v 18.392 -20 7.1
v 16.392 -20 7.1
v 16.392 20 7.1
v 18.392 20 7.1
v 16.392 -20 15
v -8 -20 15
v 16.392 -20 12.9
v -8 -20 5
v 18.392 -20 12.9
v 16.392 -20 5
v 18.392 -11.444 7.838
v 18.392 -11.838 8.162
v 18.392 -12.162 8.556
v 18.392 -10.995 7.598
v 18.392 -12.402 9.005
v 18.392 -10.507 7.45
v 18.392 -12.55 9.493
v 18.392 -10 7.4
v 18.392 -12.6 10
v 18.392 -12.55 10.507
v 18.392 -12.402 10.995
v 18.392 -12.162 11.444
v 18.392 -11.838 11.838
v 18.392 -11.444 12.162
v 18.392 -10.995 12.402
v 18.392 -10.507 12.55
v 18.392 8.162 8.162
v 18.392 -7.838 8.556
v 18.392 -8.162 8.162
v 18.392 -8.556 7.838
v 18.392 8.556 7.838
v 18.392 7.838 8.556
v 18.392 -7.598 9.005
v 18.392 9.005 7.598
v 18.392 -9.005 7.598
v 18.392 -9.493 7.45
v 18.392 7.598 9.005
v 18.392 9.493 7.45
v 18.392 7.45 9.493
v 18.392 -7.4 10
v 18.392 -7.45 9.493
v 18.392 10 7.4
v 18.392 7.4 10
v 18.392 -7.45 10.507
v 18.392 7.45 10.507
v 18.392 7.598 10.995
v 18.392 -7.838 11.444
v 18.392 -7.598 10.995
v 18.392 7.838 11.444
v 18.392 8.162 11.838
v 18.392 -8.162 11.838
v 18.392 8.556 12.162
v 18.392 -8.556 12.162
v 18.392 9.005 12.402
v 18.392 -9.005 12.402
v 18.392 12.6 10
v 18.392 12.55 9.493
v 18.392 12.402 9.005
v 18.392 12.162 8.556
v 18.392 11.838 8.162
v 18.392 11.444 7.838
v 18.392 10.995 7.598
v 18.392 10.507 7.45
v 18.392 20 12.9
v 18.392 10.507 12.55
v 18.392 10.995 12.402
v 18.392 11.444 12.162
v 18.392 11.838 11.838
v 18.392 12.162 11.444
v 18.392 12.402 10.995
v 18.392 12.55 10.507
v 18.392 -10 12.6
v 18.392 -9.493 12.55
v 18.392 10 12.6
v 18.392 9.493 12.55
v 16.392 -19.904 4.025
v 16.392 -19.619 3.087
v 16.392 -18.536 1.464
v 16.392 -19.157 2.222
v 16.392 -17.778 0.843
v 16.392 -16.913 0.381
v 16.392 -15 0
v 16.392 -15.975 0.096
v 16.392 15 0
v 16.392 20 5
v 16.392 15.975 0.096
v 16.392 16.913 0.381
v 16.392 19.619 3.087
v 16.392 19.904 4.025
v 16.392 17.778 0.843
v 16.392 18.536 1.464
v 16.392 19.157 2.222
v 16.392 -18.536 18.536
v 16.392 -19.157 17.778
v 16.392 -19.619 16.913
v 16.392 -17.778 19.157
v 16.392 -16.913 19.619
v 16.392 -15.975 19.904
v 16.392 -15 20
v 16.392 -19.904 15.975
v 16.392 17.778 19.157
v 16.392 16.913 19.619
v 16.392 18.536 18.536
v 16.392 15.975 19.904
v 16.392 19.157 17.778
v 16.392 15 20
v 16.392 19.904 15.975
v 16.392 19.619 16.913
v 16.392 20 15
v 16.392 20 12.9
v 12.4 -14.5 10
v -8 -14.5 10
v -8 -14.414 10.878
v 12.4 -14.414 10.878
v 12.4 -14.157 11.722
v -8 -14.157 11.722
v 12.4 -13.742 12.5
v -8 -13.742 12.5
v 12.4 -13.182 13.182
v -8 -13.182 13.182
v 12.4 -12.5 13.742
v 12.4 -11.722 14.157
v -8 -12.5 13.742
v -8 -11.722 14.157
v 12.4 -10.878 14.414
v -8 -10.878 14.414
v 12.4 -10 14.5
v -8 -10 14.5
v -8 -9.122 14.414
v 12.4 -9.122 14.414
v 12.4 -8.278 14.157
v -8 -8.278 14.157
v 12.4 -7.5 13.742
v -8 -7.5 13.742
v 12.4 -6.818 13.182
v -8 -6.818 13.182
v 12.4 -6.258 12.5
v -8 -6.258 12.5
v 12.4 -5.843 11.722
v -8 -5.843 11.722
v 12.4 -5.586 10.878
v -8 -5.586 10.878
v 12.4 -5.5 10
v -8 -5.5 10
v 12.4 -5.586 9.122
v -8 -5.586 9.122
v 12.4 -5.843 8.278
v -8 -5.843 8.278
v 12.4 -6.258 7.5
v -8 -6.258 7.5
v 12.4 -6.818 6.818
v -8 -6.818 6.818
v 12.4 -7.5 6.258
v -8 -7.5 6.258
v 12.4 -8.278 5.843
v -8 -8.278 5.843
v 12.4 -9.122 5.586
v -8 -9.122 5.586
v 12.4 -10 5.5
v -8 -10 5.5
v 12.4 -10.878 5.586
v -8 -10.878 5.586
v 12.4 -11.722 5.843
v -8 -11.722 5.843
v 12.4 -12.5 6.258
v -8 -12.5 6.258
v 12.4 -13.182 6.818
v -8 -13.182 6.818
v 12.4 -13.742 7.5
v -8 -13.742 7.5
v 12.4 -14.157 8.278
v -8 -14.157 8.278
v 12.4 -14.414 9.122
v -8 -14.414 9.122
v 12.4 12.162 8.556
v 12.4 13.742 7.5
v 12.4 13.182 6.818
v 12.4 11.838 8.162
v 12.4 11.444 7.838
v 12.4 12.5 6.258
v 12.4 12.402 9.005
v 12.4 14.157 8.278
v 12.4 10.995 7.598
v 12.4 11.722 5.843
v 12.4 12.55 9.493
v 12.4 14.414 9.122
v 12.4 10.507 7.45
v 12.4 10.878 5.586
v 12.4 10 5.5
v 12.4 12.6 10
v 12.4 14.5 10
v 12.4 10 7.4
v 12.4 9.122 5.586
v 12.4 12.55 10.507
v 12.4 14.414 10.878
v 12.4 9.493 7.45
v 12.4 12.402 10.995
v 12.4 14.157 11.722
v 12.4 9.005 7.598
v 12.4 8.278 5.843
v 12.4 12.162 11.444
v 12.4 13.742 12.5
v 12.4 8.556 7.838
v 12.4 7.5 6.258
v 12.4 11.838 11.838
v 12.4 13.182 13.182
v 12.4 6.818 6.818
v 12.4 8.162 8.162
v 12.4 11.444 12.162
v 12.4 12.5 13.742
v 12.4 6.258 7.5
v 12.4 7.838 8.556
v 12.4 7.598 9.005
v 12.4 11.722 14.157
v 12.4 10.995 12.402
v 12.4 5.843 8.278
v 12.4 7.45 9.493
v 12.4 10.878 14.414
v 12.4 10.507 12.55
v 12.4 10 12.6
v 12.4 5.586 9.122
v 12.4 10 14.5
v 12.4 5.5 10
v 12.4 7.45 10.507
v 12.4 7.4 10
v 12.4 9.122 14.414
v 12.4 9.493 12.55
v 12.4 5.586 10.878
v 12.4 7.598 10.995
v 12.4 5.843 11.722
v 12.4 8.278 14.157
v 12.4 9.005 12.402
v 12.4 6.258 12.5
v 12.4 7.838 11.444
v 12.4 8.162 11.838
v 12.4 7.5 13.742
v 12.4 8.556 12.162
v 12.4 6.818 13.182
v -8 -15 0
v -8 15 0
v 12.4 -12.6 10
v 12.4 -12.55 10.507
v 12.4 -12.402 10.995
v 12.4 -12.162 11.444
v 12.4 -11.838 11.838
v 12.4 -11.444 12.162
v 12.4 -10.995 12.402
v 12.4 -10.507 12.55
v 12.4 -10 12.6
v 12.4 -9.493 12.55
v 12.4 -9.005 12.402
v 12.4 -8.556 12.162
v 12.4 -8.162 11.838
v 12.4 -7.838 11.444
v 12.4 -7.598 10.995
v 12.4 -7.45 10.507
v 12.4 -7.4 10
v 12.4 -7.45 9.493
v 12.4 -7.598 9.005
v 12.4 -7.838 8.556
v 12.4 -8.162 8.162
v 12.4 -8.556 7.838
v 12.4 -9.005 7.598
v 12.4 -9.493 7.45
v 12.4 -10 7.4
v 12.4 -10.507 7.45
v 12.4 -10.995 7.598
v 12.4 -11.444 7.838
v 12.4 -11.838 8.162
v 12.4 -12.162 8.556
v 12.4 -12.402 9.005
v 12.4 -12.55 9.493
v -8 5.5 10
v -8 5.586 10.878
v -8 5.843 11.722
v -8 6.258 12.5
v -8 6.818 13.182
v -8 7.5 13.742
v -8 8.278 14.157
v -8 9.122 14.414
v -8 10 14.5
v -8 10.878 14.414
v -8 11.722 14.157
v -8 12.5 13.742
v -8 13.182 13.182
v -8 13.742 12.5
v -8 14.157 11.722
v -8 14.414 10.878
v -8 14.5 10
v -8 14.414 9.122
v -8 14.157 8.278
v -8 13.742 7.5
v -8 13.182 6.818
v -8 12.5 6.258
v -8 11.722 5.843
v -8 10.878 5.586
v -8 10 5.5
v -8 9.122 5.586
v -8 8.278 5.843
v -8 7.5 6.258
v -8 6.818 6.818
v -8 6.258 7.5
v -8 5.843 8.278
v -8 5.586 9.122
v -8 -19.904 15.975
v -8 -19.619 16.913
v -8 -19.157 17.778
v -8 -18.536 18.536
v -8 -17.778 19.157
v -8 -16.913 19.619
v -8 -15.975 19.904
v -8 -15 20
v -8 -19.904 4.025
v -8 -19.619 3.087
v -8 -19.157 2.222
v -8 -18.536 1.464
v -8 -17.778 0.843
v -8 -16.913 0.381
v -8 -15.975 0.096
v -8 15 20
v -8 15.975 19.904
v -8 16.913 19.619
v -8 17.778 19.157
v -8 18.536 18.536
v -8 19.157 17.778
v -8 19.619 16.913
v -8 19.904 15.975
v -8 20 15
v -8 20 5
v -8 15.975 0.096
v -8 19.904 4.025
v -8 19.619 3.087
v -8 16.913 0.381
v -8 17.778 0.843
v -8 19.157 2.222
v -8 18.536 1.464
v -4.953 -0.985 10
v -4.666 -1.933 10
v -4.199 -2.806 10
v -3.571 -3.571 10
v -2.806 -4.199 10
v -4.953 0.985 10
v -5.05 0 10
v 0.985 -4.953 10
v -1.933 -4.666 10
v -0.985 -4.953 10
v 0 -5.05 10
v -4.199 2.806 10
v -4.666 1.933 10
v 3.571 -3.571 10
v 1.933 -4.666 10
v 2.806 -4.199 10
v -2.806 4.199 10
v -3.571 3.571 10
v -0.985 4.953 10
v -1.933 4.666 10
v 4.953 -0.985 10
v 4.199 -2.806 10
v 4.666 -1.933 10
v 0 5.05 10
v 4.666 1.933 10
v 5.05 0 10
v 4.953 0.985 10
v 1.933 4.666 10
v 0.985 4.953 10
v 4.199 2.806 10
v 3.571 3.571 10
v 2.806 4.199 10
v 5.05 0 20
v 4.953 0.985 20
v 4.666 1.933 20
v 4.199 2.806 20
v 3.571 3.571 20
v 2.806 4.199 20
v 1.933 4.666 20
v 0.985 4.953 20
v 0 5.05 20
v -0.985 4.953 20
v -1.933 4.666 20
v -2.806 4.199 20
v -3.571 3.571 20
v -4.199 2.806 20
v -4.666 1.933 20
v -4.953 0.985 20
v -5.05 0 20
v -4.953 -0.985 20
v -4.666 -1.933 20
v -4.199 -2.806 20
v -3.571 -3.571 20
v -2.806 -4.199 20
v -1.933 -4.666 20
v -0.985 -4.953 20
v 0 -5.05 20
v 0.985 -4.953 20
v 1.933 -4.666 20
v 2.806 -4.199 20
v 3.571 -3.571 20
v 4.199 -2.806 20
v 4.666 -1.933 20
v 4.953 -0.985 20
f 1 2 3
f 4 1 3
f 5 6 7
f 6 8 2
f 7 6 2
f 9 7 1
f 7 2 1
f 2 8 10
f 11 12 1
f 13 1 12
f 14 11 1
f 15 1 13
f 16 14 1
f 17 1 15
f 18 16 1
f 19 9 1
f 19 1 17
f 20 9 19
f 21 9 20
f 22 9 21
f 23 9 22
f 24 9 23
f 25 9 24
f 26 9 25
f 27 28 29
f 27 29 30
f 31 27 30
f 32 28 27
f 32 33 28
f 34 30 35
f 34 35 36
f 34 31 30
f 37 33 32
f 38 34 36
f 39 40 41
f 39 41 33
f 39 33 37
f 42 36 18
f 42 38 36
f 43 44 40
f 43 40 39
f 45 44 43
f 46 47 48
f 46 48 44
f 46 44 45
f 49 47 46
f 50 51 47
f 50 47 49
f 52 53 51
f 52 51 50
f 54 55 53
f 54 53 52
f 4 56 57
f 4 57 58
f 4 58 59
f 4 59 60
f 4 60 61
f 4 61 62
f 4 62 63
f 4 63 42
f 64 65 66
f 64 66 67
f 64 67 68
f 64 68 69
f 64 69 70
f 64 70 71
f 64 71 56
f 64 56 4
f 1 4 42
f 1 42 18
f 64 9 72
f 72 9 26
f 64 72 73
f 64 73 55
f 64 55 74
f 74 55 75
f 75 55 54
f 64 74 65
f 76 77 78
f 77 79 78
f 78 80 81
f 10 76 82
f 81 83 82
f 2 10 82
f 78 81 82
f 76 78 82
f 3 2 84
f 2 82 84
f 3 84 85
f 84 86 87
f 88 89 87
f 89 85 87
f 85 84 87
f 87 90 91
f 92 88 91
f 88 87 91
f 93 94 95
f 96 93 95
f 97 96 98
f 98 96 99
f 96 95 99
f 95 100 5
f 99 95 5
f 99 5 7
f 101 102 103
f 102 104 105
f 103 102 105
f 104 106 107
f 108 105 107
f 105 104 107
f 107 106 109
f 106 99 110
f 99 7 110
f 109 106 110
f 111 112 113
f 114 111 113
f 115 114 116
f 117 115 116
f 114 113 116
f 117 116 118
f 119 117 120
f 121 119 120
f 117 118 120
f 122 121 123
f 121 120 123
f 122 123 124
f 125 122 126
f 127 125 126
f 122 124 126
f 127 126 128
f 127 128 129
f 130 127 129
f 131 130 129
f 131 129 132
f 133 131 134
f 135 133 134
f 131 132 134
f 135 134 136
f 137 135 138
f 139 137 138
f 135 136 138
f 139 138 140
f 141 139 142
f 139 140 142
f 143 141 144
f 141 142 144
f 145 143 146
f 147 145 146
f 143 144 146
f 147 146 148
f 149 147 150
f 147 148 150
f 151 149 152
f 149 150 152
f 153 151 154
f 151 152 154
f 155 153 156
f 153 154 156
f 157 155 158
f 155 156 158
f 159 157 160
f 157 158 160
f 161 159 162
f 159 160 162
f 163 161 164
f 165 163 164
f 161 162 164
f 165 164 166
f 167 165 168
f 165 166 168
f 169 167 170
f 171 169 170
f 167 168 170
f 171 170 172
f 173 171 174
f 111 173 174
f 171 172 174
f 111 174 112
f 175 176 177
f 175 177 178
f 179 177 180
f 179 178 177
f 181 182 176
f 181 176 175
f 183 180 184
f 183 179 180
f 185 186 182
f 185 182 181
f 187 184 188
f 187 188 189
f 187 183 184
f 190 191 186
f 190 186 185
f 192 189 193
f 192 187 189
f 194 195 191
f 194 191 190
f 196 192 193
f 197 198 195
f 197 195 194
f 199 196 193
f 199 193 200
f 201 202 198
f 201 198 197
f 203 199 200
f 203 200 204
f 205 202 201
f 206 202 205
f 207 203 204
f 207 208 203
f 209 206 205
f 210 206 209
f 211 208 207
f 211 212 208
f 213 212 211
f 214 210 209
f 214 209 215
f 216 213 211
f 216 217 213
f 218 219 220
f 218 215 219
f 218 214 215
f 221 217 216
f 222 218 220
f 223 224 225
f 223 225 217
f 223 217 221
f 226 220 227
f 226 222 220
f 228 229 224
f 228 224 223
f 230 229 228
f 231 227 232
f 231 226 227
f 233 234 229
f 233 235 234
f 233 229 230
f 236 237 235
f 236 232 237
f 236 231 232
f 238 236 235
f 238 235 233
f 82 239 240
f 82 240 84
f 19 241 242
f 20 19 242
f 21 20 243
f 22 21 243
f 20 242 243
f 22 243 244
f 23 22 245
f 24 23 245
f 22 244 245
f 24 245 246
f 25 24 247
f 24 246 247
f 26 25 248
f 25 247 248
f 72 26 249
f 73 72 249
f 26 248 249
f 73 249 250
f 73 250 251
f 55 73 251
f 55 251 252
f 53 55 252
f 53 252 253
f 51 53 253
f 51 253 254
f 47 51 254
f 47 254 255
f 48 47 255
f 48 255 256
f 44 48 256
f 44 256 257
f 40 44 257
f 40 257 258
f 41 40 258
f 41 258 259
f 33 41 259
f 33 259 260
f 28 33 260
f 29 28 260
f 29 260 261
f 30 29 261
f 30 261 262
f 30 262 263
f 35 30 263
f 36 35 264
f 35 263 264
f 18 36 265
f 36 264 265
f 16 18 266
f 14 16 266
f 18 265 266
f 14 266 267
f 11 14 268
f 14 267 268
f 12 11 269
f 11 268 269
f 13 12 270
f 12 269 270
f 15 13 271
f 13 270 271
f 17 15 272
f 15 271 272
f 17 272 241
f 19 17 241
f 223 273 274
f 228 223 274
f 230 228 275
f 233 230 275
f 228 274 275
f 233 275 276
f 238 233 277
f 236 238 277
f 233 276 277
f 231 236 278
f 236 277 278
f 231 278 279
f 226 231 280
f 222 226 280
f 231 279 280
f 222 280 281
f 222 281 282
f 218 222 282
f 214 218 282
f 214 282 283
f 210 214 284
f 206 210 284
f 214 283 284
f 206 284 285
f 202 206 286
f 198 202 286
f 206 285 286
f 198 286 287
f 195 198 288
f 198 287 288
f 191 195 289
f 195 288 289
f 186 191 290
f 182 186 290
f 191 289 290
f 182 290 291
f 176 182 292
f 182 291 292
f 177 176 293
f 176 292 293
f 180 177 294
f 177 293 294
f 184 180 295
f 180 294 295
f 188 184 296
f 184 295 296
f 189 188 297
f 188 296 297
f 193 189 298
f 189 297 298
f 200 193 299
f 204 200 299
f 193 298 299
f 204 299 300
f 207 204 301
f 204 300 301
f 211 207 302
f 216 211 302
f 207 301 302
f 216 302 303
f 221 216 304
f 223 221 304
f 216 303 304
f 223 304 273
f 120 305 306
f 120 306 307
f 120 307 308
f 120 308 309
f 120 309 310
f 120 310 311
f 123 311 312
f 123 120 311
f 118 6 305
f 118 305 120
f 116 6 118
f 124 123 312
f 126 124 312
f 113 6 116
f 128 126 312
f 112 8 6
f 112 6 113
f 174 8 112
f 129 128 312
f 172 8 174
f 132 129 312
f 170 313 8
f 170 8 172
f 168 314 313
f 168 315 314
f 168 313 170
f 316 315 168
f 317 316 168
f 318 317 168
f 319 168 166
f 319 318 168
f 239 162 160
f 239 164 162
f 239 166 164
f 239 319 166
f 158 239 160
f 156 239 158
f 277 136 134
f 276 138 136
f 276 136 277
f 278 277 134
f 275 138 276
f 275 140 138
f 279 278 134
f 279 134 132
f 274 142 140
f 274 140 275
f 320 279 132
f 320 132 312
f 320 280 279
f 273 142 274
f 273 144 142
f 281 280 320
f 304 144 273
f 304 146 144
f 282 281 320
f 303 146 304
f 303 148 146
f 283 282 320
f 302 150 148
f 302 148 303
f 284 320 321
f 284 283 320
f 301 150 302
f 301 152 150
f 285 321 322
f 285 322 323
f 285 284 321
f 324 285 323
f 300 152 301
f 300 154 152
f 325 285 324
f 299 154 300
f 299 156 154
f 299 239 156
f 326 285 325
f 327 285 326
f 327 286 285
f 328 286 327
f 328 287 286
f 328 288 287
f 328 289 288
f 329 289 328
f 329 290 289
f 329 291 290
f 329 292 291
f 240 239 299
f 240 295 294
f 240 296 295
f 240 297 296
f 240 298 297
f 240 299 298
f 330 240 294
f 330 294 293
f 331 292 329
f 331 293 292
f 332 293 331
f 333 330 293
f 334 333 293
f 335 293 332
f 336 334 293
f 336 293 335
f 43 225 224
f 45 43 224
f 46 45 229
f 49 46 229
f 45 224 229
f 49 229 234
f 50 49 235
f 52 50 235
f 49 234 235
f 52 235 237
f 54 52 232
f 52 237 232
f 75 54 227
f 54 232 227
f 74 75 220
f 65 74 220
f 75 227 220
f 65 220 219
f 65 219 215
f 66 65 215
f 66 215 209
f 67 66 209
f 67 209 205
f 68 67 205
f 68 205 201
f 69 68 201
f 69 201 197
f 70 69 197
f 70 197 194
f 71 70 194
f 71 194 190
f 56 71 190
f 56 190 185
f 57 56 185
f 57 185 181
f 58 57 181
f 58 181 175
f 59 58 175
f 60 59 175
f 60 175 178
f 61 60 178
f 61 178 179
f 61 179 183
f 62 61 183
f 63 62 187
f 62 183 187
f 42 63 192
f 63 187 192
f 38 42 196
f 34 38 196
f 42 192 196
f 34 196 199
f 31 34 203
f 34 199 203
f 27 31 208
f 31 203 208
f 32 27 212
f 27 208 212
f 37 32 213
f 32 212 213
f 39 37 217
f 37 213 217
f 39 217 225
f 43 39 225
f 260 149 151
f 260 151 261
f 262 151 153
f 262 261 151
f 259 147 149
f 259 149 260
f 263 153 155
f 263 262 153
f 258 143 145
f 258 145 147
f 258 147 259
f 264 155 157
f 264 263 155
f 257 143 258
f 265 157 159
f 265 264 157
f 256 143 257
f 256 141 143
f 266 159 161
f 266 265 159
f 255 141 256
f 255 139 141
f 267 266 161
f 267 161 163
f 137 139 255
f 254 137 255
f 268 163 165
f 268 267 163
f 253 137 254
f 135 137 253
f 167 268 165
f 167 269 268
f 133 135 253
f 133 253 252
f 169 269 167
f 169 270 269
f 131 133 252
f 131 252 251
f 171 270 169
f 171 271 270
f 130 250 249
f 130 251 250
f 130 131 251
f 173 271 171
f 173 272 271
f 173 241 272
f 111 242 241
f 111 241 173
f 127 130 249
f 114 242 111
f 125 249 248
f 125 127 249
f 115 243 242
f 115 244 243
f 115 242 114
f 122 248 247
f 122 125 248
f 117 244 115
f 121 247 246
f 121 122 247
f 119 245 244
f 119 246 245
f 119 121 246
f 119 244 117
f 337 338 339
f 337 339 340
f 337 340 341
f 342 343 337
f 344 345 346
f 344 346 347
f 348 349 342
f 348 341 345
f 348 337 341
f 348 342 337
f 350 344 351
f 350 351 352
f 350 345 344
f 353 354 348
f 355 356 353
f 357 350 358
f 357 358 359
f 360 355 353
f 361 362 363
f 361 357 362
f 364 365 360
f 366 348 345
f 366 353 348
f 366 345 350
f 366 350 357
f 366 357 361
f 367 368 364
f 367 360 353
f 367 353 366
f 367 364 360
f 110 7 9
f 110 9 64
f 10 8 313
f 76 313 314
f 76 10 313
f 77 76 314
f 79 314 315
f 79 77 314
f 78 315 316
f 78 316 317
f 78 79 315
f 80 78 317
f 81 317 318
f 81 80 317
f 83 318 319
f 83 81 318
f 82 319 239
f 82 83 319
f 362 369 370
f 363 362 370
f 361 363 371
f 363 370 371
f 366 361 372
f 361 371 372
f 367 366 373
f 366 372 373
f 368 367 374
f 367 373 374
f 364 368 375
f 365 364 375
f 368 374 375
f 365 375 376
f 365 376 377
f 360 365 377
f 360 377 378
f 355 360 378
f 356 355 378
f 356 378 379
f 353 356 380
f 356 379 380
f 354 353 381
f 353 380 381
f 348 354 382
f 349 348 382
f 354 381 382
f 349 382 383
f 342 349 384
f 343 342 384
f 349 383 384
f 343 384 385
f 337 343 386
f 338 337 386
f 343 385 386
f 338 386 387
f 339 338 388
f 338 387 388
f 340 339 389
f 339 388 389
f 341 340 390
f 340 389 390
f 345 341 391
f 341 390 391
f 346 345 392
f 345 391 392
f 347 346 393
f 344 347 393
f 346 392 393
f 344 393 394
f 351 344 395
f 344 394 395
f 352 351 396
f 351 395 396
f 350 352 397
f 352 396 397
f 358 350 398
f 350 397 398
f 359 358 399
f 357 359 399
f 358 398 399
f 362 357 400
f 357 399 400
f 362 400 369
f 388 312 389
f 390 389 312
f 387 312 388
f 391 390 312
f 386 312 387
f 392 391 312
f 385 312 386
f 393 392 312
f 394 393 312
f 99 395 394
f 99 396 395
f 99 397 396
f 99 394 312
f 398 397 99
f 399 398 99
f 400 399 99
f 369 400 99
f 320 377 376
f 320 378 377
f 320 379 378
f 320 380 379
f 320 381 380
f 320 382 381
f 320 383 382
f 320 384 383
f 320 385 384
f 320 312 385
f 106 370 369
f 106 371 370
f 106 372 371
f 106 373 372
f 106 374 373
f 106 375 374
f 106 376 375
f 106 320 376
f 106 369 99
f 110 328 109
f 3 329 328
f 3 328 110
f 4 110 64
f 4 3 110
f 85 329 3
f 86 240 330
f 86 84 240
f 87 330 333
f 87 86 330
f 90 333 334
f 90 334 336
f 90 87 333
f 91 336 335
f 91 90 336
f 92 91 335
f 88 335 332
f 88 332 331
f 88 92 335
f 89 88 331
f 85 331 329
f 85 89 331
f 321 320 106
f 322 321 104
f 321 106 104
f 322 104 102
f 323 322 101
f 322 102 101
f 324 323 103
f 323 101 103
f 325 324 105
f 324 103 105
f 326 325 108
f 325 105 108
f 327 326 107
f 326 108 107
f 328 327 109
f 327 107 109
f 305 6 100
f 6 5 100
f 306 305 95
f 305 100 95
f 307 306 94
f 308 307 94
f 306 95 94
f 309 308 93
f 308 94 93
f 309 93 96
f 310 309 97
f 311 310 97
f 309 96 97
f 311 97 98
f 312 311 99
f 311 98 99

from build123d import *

# Parameters (mm, degrees)
F0_W     = 24.392
F0_H     = 40
F1_DEPTH = 20
F2_R     = 5.05
F3_DEPTH = 10
F4_W     = 40
F4_H     = 5.8
F5_DEPTH = 2
F6_R     = 2.6
F7_DEPTH = 26.393
F8_R     = 4.5
F9_DEPTH = 20.4
F10_R    = 5


with BuildPart() as f1:
    # F0 (on Top) → F1 (new body)
    with BuildSketch(Plane.XY):
        with Locations((4.196, 0)):
            Rectangle(F0_W, F0_H)
    extrude(amount=F1_DEPTH)

    # F2 (on face) → F3 (cut)
    with BuildSketch(Plane.XY.offset(20)):
        Circle(F2_R)
    extrude(amount=-F3_DEPTH, mode=Mode.SUBTRACT)

    # F4 (on face) → F5 (join)
    with BuildSketch(Plane.YZ.offset(16.392)):
        with Locations((0, 10)):
            Rectangle(F4_W, F4_H)
    extrude(amount=F5_DEPTH)

    # F6 (on face) → F7 (cut, through all)
    with BuildSketch(Plane(origin=(-8, 0, 0), x_dir=(0, -1, 0), z_dir=(-1, 0, 0))):
        with Locations((-10, 10)):
            Circle(F6_R)
        with Locations((10, 10)):
            Circle(F6_R)
    extrude(amount=-F7_DEPTH, mode=Mode.SUBTRACT)

    # F8 (on face) → F9 (cut)
    with BuildSketch(Plane(origin=(-8, 0, 0), x_dir=(0, -1, 0), z_dir=(-1, 0, 0))):
        with Locations((-10, 10)):
            Circle(F8_R)
        with Locations((10, 10)):
            Circle(F8_R)
    extrude(amount=-F9_DEPTH, mode=Mode.SUBTRACT)

    # F10
    f10_edges = [f1.edges().sort_by_distance(p)[0] for p in [
        (4.196, -20, 20),
        (4.196, 20, 20),
        (4.196, -20, 0),
        (4.196, 20, 0),
    ]]
    fillet(f10_edges, radius=F10_R)


solid = f1.part
